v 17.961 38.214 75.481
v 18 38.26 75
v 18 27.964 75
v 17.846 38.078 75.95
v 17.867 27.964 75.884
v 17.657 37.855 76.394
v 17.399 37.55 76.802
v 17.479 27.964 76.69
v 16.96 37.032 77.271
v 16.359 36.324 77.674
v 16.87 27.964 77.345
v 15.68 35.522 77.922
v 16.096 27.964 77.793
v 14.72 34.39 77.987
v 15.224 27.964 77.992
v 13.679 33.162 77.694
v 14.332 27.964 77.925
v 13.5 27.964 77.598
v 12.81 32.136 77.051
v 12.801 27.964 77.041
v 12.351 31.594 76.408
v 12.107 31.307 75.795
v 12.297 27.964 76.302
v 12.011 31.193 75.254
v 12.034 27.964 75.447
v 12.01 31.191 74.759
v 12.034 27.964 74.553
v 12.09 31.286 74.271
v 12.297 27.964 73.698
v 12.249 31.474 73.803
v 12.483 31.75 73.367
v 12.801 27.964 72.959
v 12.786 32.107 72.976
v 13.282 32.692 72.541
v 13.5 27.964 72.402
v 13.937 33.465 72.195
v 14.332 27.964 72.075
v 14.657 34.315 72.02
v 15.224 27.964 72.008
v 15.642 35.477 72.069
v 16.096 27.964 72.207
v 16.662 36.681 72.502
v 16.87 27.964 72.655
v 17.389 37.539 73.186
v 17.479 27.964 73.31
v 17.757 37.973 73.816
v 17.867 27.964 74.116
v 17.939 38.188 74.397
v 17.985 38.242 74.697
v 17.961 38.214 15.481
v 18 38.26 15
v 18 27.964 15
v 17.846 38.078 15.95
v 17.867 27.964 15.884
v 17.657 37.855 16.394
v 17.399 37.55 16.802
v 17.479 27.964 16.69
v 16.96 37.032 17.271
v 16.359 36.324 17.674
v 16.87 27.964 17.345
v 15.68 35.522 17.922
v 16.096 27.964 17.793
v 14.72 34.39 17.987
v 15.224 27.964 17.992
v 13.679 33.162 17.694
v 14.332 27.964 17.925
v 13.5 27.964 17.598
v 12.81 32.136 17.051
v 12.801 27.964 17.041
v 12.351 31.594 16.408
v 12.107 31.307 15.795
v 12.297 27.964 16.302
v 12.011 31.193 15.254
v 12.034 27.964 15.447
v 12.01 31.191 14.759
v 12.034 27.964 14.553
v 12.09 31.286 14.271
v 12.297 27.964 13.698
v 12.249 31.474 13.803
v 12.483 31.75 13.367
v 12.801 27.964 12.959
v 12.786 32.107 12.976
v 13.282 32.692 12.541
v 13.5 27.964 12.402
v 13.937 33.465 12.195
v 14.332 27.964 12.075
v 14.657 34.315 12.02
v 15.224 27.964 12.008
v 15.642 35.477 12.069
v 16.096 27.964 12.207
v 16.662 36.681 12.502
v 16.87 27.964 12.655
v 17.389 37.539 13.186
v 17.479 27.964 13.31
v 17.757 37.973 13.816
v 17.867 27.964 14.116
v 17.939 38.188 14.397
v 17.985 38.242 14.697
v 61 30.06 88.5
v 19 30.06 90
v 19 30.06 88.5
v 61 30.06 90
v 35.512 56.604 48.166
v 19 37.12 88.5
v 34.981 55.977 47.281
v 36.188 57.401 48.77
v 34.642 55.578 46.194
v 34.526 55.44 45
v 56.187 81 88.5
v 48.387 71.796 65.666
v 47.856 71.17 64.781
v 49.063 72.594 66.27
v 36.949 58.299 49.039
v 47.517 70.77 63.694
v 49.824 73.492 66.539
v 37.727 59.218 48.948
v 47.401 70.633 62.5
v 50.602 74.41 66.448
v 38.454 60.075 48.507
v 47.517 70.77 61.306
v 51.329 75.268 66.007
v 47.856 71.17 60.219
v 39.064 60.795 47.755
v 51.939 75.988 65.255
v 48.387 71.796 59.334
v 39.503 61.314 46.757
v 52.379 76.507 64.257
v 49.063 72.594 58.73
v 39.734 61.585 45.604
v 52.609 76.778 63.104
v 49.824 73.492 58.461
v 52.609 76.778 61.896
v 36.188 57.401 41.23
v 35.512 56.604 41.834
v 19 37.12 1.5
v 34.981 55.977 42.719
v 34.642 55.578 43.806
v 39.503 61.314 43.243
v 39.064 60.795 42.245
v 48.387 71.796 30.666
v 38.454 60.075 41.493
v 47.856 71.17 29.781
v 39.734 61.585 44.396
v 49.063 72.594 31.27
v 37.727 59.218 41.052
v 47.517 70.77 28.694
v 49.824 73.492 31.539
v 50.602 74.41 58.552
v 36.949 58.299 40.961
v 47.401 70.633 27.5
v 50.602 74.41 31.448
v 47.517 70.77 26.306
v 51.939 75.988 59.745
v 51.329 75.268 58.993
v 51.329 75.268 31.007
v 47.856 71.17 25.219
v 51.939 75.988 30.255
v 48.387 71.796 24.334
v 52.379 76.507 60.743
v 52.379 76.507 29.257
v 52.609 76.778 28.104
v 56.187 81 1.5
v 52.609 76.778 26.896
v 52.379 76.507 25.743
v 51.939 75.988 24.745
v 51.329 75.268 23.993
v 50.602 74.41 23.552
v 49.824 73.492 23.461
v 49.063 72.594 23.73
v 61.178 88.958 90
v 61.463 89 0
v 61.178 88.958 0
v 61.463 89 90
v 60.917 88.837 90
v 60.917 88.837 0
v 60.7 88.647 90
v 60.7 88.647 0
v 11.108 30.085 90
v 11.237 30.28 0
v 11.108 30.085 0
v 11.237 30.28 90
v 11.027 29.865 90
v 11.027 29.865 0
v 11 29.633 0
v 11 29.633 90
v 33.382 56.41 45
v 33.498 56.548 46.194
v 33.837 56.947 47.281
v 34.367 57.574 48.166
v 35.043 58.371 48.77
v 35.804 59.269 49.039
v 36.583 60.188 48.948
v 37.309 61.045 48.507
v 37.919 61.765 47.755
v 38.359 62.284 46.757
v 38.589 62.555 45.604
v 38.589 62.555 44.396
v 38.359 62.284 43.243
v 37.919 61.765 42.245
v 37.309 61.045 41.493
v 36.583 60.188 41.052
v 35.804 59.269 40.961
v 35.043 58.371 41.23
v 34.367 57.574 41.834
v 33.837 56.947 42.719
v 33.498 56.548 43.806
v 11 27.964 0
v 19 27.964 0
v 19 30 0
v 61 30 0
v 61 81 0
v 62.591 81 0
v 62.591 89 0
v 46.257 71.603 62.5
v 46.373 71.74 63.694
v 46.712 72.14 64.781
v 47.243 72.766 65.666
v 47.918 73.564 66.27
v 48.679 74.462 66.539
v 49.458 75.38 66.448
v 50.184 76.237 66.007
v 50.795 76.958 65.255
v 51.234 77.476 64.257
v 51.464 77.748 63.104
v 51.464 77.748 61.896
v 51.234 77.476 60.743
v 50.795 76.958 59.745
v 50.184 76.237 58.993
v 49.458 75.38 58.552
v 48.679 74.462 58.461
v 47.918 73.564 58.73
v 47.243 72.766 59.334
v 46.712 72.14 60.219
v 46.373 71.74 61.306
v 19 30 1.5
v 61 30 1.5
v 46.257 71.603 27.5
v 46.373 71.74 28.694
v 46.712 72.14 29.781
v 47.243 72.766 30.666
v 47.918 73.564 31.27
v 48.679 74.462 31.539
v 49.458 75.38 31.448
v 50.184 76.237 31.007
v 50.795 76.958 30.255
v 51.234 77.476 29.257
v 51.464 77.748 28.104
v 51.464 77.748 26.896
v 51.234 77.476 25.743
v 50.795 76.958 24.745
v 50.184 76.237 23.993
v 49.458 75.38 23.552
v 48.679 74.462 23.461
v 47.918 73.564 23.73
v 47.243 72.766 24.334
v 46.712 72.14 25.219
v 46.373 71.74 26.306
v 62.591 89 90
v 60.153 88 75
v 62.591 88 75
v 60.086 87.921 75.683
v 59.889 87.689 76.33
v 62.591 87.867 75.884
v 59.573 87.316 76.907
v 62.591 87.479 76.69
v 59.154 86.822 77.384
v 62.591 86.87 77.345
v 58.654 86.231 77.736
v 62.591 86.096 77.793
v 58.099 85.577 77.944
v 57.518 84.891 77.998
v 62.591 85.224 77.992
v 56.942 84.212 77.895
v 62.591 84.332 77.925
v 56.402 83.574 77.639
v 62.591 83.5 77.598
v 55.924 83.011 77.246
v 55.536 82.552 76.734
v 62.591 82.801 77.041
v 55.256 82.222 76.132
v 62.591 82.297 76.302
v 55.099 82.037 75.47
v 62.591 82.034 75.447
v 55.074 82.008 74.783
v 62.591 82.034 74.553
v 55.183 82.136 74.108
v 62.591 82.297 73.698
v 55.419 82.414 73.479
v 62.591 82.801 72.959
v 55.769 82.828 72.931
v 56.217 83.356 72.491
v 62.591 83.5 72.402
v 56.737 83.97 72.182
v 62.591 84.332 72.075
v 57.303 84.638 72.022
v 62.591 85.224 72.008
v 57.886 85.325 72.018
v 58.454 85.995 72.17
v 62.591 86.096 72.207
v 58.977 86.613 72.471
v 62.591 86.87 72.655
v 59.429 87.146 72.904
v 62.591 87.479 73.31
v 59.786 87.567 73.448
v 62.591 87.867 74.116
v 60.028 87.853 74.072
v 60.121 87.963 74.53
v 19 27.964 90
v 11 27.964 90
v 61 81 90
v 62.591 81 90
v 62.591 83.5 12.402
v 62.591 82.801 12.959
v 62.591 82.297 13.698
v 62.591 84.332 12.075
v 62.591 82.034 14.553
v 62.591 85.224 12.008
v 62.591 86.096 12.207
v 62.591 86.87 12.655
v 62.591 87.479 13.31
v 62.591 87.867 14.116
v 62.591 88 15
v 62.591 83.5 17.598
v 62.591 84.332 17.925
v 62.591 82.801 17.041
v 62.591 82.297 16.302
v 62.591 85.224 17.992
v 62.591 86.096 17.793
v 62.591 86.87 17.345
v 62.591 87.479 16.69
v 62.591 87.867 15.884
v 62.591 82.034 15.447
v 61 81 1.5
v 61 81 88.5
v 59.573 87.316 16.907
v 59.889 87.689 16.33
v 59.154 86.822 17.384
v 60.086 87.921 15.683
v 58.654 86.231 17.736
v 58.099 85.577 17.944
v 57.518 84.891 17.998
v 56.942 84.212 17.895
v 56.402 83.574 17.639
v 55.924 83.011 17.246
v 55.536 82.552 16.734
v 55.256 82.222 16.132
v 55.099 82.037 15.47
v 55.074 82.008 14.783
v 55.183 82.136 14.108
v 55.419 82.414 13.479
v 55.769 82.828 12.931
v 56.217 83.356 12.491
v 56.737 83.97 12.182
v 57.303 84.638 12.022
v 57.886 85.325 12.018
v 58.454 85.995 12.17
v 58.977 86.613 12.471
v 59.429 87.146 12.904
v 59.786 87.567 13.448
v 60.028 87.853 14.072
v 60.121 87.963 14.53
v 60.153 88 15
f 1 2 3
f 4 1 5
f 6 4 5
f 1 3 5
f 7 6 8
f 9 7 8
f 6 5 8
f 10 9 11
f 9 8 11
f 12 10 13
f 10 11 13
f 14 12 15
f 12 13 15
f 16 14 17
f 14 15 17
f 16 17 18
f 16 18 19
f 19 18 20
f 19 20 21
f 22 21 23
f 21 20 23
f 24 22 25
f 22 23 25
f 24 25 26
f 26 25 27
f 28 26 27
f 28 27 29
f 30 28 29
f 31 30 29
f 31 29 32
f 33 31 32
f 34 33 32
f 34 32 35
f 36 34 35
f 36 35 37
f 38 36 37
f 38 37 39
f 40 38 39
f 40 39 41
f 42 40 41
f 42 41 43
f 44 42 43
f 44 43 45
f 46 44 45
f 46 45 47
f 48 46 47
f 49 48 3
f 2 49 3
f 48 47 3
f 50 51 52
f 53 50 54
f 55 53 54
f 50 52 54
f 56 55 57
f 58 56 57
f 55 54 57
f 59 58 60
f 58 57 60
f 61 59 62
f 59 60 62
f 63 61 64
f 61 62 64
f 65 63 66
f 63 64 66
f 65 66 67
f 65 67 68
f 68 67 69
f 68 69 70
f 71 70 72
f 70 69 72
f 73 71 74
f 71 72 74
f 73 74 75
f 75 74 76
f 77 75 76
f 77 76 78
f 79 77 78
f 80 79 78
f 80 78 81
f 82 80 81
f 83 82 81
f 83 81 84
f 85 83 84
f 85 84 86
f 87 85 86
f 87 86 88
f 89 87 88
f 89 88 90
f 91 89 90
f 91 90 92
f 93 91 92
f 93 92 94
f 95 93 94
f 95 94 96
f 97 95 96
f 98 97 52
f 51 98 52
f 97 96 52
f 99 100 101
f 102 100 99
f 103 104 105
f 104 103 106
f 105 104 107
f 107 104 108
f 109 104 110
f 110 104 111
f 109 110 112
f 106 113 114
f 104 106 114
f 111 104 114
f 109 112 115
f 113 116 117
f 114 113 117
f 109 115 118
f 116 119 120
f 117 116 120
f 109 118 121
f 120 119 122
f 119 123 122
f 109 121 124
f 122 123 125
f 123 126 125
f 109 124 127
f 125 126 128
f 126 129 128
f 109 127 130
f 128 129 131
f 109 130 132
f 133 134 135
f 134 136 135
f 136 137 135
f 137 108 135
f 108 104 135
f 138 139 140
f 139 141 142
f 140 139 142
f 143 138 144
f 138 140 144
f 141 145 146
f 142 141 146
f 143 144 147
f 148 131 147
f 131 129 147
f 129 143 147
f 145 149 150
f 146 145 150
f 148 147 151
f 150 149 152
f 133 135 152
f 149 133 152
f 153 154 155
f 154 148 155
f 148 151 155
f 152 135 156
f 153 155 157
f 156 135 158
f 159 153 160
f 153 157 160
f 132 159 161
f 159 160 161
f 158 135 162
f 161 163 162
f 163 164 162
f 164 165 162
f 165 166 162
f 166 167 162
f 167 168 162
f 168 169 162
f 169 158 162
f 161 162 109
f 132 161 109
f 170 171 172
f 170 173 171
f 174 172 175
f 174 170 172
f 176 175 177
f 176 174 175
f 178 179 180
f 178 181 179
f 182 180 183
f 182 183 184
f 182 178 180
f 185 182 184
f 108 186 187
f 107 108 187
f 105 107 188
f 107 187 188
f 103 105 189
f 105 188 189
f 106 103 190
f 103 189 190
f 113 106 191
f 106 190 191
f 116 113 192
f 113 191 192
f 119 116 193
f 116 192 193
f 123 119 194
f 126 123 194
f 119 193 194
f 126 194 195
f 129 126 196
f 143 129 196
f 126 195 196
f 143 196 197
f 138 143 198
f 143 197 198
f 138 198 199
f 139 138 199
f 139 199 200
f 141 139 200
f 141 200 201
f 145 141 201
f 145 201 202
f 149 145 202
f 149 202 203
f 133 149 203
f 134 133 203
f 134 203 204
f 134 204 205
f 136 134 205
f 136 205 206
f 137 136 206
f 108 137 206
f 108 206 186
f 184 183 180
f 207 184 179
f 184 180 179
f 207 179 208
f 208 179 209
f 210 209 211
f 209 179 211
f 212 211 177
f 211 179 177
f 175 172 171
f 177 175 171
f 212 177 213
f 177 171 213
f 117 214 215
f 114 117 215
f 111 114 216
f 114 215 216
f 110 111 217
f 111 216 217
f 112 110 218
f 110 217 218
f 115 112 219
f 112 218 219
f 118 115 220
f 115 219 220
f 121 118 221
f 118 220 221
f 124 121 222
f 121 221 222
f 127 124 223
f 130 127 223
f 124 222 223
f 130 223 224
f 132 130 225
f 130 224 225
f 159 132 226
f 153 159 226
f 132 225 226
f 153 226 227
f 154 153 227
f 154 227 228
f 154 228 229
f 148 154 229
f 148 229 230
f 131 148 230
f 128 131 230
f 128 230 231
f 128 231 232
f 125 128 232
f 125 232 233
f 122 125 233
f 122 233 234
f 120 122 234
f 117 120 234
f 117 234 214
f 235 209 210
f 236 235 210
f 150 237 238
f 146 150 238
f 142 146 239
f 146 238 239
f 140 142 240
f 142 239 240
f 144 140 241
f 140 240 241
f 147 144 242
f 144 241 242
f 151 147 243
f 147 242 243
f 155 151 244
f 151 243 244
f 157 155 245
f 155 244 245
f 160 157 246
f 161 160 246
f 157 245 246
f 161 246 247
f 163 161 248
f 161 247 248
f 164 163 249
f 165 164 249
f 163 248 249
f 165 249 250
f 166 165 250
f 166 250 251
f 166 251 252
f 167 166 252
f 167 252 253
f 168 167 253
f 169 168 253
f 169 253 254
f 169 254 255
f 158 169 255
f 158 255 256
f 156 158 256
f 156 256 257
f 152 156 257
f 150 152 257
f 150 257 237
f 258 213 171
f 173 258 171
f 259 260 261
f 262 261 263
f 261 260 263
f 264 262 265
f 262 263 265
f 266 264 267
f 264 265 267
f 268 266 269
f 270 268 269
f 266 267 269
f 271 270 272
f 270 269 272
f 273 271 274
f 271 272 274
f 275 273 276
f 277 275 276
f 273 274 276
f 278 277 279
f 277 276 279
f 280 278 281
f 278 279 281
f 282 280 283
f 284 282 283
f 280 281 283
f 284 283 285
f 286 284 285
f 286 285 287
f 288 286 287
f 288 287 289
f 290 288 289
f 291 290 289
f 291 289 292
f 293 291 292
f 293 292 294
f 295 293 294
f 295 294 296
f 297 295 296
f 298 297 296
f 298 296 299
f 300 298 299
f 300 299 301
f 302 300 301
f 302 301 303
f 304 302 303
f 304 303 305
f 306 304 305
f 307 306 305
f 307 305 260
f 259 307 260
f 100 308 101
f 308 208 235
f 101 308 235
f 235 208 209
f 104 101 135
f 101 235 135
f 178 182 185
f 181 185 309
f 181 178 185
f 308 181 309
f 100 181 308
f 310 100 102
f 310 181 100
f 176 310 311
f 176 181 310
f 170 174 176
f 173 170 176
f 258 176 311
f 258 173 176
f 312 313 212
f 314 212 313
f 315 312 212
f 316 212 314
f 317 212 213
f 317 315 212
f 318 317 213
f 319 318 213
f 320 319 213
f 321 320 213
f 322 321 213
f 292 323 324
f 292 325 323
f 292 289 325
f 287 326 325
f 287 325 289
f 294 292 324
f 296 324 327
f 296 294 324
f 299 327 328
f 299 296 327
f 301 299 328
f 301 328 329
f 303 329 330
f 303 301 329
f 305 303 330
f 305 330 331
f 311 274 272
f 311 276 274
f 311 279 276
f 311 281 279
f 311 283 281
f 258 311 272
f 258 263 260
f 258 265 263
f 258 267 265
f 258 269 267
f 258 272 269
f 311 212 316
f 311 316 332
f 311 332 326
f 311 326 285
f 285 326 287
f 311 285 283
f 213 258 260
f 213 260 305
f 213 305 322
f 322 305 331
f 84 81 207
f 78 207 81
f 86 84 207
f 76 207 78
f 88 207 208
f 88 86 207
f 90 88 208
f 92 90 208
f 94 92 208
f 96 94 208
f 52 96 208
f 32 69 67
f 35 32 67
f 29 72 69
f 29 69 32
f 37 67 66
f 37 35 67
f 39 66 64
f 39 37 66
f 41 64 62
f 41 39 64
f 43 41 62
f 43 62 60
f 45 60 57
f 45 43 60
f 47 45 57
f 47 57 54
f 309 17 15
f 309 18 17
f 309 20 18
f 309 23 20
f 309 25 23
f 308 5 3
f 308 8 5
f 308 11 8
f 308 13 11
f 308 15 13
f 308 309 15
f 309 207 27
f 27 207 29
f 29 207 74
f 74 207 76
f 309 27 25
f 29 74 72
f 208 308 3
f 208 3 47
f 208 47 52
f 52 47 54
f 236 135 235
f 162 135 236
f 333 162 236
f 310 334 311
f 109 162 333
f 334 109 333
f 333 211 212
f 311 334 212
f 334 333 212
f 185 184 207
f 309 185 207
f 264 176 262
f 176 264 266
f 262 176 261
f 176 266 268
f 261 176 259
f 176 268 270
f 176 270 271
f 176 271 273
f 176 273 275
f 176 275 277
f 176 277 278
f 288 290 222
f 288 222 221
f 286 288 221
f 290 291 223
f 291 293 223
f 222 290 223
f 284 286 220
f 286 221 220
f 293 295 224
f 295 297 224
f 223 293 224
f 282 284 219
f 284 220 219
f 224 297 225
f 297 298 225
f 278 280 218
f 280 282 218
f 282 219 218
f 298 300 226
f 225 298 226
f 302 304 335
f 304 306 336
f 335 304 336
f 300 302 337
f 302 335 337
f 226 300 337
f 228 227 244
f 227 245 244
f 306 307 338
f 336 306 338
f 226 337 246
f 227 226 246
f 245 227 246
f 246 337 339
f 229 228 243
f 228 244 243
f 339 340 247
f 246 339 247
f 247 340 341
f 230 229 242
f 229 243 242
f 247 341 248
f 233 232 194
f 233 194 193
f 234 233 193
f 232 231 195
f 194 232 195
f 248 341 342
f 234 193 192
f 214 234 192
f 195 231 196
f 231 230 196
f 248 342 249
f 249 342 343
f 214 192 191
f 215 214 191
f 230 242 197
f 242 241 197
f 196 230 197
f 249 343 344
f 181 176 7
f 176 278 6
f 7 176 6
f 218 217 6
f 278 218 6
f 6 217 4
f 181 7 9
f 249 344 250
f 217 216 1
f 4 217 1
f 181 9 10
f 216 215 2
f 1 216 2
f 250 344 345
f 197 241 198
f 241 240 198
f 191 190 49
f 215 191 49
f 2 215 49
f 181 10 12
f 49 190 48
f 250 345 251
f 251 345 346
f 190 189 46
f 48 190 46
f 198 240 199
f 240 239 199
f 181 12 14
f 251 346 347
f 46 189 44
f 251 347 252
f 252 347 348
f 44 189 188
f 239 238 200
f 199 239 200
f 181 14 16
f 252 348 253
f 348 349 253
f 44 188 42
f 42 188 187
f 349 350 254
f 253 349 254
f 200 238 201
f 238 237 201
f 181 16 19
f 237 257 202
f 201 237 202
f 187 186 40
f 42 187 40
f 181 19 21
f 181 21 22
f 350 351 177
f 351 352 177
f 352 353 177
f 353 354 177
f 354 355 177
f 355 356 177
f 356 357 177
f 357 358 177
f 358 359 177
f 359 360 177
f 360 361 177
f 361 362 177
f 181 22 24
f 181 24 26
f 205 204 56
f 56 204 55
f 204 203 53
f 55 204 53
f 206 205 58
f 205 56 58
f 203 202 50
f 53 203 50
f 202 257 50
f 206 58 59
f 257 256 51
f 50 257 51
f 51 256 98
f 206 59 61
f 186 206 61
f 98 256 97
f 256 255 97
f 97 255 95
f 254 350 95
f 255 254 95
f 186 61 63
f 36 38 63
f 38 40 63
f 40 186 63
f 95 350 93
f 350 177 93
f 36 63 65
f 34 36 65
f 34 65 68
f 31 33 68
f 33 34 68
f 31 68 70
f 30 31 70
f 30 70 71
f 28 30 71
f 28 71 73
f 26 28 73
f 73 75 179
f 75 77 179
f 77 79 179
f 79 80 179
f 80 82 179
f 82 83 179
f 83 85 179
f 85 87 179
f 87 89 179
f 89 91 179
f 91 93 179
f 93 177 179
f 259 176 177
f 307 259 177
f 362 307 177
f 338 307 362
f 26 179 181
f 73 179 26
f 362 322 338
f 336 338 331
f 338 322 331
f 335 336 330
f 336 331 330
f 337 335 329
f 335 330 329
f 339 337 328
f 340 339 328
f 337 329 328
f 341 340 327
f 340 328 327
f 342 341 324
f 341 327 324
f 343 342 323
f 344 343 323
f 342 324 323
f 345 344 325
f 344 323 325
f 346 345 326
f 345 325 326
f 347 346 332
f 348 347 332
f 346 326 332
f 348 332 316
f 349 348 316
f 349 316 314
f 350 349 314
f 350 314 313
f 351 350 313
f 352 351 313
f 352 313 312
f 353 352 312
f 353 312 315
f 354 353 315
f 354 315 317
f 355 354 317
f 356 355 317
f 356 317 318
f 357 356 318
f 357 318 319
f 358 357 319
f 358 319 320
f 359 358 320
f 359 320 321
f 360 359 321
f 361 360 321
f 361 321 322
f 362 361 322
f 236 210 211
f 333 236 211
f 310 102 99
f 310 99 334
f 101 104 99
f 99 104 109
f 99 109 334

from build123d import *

# Parameters (mm, degrees)
F1_DEPTH  = 90
F2_R      = 4.05
F3_DEPTH  = 25
F5_DEPTH  = 25
F6_R      = 1.75
F7_DEPTH  = 25
F9_R      = 3
F10_DEPTH = 25
F12_R     = 3
F13_DEPTH = 25
F14_SIZE  = 2
F15_R     = 1
F17_DEPTH = 1.5
F19_DEPTH = 1.5
F20_W     = 9.3469619751
F20_H     = 10.4837566614
F20_W_2   = 11.7468573153
F20_H_2   = 8.0838575959
F21_DEPTH = 90.001


with BuildPart() as f1:
    # F0 (on Top) → F1 (new body)
    with BuildSketch(Plane.XY):
        Polygon((70, 89), (61, 89), (11, 30), (11, 21), (19, 21), (19, 30), (19, 33.3303359461), (19, 37.1198922439), (56.1865319967, 81), (61, 81), (70, 81), align=None)
    extrude(amount=F1_DEPTH)

    # F2 (on face) → F3 (cut)
    with BuildSketch(Plane(origin=(-8.3947500418, 7.1141949507, 0), x_dir=(-0.6465216954, -0.7628956006, 0), z_dir=(-0.7628956006, 0.6465216954, 0))):
        with Locations((-88.5814800858, 27.5)):
            Circle(F2_R)
        with Locations((-88.5814800858, 62.5)):
            Circle(F2_R)
        with Locations((-68.6670692686, 45)):
            Circle(F2_R)
    extrude(amount=-F3_DEPTH, mode=Mode.SUBTRACT)

    # F4 (on face) → F5 (cut)
    with BuildSketch(Plane.XZ.offset(-21)):
        with BuildLine():
            ThreePointArc((16.75, 75), (16.2374368671, 76.2374368671), (15, 76.75))
            Line((15, 76.75), (15, 73.25))
            ThreePointArc((15, 73.25), (16.2374368671, 73.7625631329), (16.75, 75))
        make_face()
        with BuildLine():
            ThreePointArc((16.75, 15), (16.2374368671, 16.2374368671), (15, 16.75))
            Line((15, 16.75), (15, 13.25))
            ThreePointArc((15, 13.25), (16.2374368671, 13.7625631329), (16.75, 15))
        make_face()
        with BuildLine():
            Line((15, 13.25), (15, 16.75))
            ThreePointArc((15, 16.75), (13.25, 15), (15, 13.25))
        make_face()
        with BuildLine():
            Line((15, 73.25), (15, 76.75))
            ThreePointArc((15, 76.75), (13.25, 75), (15, 73.25))
        make_face()
    extrude(amount=-F5_DEPTH, mode=Mode.SUBTRACT)

    # F6 (on face) → F7 (cut)
    with BuildSketch(Plane.YZ.offset(70)):
        with Locations((85, 75)):
            Circle(F6_R)
        with Locations((85, 15)):
            Circle(F6_R)
    extrude(amount=-F7_DEPTH, mode=Mode.SUBTRACT)

    # F9 (on offset) → F10 (cut)
    with BuildSketch(Plane.YZ.offset(65)):
        with Locations((85, 75)):
            Circle(F9_R)
        with Locations((85, 15)):
            Circle(F9_R)
    extrude(amount=-F10_DEPTH, mode=Mode.SUBTRACT)

    # F12 (on offset) → F13 (cut)
    with BuildSketch(Plane.XZ.offset(-26)):
        with Locations((15, 75)):
            Circle(F12_R)
        with Locations((15, 15)):
            Circle(F12_R)
    extrude(amount=-F13_DEPTH, mode=Mode.SUBTRACT)

    # F14
    f14_edges = [f1.edges().sort_by_distance(p)[0] for p in [
        (70, 81, 45),
        (70, 89, 45),
        (19, 21, 45),
        (11, 21, 45),
    ]]
    chamfer(f14_edges, length=F14_SIZE)

    # F15
    f15_edges = [f1.edges().sort_by_distance(p)[0] for p in [
        (61, 89, 45),
        (11, 30, 45),
    ]]
    fillet(f15_edges, radius=F15_R)

    # F16 (on face) → F17 (join)
    with BuildSketch(Plane.XY.offset(90)):
        Polygon((19, 37.1198922439), (19, 30.0599461219), (61, 30.0599461219), (61, 81), (56.1865319967, 81), align=None)
    extrude(amount=-F17_DEPTH)

    # F18 (on face) → F19 (join)
    with BuildSketch(Plane.XY):
        Polygon((61, 30), (61, 81), (56.1865319967, 81), (19, 37.1198922439), (19, 30), align=None)
    extrude(amount=F19_DEPTH)

    # F20 (on face) → F21 (cut, through all)
    with BuildSketch(Plane.XY.offset(90)):
        with Locations((67.2643706203, 84.9928185344)):
            Rectangle(F20_W, F20_H)
        with Locations((15.4358148575, 23.9219143987)):
            Rectangle(F20_W_2, F20_H_2)
    extrude(amount=-F21_DEPTH, mode=Mode.SUBTRACT)


solid = f1.part
